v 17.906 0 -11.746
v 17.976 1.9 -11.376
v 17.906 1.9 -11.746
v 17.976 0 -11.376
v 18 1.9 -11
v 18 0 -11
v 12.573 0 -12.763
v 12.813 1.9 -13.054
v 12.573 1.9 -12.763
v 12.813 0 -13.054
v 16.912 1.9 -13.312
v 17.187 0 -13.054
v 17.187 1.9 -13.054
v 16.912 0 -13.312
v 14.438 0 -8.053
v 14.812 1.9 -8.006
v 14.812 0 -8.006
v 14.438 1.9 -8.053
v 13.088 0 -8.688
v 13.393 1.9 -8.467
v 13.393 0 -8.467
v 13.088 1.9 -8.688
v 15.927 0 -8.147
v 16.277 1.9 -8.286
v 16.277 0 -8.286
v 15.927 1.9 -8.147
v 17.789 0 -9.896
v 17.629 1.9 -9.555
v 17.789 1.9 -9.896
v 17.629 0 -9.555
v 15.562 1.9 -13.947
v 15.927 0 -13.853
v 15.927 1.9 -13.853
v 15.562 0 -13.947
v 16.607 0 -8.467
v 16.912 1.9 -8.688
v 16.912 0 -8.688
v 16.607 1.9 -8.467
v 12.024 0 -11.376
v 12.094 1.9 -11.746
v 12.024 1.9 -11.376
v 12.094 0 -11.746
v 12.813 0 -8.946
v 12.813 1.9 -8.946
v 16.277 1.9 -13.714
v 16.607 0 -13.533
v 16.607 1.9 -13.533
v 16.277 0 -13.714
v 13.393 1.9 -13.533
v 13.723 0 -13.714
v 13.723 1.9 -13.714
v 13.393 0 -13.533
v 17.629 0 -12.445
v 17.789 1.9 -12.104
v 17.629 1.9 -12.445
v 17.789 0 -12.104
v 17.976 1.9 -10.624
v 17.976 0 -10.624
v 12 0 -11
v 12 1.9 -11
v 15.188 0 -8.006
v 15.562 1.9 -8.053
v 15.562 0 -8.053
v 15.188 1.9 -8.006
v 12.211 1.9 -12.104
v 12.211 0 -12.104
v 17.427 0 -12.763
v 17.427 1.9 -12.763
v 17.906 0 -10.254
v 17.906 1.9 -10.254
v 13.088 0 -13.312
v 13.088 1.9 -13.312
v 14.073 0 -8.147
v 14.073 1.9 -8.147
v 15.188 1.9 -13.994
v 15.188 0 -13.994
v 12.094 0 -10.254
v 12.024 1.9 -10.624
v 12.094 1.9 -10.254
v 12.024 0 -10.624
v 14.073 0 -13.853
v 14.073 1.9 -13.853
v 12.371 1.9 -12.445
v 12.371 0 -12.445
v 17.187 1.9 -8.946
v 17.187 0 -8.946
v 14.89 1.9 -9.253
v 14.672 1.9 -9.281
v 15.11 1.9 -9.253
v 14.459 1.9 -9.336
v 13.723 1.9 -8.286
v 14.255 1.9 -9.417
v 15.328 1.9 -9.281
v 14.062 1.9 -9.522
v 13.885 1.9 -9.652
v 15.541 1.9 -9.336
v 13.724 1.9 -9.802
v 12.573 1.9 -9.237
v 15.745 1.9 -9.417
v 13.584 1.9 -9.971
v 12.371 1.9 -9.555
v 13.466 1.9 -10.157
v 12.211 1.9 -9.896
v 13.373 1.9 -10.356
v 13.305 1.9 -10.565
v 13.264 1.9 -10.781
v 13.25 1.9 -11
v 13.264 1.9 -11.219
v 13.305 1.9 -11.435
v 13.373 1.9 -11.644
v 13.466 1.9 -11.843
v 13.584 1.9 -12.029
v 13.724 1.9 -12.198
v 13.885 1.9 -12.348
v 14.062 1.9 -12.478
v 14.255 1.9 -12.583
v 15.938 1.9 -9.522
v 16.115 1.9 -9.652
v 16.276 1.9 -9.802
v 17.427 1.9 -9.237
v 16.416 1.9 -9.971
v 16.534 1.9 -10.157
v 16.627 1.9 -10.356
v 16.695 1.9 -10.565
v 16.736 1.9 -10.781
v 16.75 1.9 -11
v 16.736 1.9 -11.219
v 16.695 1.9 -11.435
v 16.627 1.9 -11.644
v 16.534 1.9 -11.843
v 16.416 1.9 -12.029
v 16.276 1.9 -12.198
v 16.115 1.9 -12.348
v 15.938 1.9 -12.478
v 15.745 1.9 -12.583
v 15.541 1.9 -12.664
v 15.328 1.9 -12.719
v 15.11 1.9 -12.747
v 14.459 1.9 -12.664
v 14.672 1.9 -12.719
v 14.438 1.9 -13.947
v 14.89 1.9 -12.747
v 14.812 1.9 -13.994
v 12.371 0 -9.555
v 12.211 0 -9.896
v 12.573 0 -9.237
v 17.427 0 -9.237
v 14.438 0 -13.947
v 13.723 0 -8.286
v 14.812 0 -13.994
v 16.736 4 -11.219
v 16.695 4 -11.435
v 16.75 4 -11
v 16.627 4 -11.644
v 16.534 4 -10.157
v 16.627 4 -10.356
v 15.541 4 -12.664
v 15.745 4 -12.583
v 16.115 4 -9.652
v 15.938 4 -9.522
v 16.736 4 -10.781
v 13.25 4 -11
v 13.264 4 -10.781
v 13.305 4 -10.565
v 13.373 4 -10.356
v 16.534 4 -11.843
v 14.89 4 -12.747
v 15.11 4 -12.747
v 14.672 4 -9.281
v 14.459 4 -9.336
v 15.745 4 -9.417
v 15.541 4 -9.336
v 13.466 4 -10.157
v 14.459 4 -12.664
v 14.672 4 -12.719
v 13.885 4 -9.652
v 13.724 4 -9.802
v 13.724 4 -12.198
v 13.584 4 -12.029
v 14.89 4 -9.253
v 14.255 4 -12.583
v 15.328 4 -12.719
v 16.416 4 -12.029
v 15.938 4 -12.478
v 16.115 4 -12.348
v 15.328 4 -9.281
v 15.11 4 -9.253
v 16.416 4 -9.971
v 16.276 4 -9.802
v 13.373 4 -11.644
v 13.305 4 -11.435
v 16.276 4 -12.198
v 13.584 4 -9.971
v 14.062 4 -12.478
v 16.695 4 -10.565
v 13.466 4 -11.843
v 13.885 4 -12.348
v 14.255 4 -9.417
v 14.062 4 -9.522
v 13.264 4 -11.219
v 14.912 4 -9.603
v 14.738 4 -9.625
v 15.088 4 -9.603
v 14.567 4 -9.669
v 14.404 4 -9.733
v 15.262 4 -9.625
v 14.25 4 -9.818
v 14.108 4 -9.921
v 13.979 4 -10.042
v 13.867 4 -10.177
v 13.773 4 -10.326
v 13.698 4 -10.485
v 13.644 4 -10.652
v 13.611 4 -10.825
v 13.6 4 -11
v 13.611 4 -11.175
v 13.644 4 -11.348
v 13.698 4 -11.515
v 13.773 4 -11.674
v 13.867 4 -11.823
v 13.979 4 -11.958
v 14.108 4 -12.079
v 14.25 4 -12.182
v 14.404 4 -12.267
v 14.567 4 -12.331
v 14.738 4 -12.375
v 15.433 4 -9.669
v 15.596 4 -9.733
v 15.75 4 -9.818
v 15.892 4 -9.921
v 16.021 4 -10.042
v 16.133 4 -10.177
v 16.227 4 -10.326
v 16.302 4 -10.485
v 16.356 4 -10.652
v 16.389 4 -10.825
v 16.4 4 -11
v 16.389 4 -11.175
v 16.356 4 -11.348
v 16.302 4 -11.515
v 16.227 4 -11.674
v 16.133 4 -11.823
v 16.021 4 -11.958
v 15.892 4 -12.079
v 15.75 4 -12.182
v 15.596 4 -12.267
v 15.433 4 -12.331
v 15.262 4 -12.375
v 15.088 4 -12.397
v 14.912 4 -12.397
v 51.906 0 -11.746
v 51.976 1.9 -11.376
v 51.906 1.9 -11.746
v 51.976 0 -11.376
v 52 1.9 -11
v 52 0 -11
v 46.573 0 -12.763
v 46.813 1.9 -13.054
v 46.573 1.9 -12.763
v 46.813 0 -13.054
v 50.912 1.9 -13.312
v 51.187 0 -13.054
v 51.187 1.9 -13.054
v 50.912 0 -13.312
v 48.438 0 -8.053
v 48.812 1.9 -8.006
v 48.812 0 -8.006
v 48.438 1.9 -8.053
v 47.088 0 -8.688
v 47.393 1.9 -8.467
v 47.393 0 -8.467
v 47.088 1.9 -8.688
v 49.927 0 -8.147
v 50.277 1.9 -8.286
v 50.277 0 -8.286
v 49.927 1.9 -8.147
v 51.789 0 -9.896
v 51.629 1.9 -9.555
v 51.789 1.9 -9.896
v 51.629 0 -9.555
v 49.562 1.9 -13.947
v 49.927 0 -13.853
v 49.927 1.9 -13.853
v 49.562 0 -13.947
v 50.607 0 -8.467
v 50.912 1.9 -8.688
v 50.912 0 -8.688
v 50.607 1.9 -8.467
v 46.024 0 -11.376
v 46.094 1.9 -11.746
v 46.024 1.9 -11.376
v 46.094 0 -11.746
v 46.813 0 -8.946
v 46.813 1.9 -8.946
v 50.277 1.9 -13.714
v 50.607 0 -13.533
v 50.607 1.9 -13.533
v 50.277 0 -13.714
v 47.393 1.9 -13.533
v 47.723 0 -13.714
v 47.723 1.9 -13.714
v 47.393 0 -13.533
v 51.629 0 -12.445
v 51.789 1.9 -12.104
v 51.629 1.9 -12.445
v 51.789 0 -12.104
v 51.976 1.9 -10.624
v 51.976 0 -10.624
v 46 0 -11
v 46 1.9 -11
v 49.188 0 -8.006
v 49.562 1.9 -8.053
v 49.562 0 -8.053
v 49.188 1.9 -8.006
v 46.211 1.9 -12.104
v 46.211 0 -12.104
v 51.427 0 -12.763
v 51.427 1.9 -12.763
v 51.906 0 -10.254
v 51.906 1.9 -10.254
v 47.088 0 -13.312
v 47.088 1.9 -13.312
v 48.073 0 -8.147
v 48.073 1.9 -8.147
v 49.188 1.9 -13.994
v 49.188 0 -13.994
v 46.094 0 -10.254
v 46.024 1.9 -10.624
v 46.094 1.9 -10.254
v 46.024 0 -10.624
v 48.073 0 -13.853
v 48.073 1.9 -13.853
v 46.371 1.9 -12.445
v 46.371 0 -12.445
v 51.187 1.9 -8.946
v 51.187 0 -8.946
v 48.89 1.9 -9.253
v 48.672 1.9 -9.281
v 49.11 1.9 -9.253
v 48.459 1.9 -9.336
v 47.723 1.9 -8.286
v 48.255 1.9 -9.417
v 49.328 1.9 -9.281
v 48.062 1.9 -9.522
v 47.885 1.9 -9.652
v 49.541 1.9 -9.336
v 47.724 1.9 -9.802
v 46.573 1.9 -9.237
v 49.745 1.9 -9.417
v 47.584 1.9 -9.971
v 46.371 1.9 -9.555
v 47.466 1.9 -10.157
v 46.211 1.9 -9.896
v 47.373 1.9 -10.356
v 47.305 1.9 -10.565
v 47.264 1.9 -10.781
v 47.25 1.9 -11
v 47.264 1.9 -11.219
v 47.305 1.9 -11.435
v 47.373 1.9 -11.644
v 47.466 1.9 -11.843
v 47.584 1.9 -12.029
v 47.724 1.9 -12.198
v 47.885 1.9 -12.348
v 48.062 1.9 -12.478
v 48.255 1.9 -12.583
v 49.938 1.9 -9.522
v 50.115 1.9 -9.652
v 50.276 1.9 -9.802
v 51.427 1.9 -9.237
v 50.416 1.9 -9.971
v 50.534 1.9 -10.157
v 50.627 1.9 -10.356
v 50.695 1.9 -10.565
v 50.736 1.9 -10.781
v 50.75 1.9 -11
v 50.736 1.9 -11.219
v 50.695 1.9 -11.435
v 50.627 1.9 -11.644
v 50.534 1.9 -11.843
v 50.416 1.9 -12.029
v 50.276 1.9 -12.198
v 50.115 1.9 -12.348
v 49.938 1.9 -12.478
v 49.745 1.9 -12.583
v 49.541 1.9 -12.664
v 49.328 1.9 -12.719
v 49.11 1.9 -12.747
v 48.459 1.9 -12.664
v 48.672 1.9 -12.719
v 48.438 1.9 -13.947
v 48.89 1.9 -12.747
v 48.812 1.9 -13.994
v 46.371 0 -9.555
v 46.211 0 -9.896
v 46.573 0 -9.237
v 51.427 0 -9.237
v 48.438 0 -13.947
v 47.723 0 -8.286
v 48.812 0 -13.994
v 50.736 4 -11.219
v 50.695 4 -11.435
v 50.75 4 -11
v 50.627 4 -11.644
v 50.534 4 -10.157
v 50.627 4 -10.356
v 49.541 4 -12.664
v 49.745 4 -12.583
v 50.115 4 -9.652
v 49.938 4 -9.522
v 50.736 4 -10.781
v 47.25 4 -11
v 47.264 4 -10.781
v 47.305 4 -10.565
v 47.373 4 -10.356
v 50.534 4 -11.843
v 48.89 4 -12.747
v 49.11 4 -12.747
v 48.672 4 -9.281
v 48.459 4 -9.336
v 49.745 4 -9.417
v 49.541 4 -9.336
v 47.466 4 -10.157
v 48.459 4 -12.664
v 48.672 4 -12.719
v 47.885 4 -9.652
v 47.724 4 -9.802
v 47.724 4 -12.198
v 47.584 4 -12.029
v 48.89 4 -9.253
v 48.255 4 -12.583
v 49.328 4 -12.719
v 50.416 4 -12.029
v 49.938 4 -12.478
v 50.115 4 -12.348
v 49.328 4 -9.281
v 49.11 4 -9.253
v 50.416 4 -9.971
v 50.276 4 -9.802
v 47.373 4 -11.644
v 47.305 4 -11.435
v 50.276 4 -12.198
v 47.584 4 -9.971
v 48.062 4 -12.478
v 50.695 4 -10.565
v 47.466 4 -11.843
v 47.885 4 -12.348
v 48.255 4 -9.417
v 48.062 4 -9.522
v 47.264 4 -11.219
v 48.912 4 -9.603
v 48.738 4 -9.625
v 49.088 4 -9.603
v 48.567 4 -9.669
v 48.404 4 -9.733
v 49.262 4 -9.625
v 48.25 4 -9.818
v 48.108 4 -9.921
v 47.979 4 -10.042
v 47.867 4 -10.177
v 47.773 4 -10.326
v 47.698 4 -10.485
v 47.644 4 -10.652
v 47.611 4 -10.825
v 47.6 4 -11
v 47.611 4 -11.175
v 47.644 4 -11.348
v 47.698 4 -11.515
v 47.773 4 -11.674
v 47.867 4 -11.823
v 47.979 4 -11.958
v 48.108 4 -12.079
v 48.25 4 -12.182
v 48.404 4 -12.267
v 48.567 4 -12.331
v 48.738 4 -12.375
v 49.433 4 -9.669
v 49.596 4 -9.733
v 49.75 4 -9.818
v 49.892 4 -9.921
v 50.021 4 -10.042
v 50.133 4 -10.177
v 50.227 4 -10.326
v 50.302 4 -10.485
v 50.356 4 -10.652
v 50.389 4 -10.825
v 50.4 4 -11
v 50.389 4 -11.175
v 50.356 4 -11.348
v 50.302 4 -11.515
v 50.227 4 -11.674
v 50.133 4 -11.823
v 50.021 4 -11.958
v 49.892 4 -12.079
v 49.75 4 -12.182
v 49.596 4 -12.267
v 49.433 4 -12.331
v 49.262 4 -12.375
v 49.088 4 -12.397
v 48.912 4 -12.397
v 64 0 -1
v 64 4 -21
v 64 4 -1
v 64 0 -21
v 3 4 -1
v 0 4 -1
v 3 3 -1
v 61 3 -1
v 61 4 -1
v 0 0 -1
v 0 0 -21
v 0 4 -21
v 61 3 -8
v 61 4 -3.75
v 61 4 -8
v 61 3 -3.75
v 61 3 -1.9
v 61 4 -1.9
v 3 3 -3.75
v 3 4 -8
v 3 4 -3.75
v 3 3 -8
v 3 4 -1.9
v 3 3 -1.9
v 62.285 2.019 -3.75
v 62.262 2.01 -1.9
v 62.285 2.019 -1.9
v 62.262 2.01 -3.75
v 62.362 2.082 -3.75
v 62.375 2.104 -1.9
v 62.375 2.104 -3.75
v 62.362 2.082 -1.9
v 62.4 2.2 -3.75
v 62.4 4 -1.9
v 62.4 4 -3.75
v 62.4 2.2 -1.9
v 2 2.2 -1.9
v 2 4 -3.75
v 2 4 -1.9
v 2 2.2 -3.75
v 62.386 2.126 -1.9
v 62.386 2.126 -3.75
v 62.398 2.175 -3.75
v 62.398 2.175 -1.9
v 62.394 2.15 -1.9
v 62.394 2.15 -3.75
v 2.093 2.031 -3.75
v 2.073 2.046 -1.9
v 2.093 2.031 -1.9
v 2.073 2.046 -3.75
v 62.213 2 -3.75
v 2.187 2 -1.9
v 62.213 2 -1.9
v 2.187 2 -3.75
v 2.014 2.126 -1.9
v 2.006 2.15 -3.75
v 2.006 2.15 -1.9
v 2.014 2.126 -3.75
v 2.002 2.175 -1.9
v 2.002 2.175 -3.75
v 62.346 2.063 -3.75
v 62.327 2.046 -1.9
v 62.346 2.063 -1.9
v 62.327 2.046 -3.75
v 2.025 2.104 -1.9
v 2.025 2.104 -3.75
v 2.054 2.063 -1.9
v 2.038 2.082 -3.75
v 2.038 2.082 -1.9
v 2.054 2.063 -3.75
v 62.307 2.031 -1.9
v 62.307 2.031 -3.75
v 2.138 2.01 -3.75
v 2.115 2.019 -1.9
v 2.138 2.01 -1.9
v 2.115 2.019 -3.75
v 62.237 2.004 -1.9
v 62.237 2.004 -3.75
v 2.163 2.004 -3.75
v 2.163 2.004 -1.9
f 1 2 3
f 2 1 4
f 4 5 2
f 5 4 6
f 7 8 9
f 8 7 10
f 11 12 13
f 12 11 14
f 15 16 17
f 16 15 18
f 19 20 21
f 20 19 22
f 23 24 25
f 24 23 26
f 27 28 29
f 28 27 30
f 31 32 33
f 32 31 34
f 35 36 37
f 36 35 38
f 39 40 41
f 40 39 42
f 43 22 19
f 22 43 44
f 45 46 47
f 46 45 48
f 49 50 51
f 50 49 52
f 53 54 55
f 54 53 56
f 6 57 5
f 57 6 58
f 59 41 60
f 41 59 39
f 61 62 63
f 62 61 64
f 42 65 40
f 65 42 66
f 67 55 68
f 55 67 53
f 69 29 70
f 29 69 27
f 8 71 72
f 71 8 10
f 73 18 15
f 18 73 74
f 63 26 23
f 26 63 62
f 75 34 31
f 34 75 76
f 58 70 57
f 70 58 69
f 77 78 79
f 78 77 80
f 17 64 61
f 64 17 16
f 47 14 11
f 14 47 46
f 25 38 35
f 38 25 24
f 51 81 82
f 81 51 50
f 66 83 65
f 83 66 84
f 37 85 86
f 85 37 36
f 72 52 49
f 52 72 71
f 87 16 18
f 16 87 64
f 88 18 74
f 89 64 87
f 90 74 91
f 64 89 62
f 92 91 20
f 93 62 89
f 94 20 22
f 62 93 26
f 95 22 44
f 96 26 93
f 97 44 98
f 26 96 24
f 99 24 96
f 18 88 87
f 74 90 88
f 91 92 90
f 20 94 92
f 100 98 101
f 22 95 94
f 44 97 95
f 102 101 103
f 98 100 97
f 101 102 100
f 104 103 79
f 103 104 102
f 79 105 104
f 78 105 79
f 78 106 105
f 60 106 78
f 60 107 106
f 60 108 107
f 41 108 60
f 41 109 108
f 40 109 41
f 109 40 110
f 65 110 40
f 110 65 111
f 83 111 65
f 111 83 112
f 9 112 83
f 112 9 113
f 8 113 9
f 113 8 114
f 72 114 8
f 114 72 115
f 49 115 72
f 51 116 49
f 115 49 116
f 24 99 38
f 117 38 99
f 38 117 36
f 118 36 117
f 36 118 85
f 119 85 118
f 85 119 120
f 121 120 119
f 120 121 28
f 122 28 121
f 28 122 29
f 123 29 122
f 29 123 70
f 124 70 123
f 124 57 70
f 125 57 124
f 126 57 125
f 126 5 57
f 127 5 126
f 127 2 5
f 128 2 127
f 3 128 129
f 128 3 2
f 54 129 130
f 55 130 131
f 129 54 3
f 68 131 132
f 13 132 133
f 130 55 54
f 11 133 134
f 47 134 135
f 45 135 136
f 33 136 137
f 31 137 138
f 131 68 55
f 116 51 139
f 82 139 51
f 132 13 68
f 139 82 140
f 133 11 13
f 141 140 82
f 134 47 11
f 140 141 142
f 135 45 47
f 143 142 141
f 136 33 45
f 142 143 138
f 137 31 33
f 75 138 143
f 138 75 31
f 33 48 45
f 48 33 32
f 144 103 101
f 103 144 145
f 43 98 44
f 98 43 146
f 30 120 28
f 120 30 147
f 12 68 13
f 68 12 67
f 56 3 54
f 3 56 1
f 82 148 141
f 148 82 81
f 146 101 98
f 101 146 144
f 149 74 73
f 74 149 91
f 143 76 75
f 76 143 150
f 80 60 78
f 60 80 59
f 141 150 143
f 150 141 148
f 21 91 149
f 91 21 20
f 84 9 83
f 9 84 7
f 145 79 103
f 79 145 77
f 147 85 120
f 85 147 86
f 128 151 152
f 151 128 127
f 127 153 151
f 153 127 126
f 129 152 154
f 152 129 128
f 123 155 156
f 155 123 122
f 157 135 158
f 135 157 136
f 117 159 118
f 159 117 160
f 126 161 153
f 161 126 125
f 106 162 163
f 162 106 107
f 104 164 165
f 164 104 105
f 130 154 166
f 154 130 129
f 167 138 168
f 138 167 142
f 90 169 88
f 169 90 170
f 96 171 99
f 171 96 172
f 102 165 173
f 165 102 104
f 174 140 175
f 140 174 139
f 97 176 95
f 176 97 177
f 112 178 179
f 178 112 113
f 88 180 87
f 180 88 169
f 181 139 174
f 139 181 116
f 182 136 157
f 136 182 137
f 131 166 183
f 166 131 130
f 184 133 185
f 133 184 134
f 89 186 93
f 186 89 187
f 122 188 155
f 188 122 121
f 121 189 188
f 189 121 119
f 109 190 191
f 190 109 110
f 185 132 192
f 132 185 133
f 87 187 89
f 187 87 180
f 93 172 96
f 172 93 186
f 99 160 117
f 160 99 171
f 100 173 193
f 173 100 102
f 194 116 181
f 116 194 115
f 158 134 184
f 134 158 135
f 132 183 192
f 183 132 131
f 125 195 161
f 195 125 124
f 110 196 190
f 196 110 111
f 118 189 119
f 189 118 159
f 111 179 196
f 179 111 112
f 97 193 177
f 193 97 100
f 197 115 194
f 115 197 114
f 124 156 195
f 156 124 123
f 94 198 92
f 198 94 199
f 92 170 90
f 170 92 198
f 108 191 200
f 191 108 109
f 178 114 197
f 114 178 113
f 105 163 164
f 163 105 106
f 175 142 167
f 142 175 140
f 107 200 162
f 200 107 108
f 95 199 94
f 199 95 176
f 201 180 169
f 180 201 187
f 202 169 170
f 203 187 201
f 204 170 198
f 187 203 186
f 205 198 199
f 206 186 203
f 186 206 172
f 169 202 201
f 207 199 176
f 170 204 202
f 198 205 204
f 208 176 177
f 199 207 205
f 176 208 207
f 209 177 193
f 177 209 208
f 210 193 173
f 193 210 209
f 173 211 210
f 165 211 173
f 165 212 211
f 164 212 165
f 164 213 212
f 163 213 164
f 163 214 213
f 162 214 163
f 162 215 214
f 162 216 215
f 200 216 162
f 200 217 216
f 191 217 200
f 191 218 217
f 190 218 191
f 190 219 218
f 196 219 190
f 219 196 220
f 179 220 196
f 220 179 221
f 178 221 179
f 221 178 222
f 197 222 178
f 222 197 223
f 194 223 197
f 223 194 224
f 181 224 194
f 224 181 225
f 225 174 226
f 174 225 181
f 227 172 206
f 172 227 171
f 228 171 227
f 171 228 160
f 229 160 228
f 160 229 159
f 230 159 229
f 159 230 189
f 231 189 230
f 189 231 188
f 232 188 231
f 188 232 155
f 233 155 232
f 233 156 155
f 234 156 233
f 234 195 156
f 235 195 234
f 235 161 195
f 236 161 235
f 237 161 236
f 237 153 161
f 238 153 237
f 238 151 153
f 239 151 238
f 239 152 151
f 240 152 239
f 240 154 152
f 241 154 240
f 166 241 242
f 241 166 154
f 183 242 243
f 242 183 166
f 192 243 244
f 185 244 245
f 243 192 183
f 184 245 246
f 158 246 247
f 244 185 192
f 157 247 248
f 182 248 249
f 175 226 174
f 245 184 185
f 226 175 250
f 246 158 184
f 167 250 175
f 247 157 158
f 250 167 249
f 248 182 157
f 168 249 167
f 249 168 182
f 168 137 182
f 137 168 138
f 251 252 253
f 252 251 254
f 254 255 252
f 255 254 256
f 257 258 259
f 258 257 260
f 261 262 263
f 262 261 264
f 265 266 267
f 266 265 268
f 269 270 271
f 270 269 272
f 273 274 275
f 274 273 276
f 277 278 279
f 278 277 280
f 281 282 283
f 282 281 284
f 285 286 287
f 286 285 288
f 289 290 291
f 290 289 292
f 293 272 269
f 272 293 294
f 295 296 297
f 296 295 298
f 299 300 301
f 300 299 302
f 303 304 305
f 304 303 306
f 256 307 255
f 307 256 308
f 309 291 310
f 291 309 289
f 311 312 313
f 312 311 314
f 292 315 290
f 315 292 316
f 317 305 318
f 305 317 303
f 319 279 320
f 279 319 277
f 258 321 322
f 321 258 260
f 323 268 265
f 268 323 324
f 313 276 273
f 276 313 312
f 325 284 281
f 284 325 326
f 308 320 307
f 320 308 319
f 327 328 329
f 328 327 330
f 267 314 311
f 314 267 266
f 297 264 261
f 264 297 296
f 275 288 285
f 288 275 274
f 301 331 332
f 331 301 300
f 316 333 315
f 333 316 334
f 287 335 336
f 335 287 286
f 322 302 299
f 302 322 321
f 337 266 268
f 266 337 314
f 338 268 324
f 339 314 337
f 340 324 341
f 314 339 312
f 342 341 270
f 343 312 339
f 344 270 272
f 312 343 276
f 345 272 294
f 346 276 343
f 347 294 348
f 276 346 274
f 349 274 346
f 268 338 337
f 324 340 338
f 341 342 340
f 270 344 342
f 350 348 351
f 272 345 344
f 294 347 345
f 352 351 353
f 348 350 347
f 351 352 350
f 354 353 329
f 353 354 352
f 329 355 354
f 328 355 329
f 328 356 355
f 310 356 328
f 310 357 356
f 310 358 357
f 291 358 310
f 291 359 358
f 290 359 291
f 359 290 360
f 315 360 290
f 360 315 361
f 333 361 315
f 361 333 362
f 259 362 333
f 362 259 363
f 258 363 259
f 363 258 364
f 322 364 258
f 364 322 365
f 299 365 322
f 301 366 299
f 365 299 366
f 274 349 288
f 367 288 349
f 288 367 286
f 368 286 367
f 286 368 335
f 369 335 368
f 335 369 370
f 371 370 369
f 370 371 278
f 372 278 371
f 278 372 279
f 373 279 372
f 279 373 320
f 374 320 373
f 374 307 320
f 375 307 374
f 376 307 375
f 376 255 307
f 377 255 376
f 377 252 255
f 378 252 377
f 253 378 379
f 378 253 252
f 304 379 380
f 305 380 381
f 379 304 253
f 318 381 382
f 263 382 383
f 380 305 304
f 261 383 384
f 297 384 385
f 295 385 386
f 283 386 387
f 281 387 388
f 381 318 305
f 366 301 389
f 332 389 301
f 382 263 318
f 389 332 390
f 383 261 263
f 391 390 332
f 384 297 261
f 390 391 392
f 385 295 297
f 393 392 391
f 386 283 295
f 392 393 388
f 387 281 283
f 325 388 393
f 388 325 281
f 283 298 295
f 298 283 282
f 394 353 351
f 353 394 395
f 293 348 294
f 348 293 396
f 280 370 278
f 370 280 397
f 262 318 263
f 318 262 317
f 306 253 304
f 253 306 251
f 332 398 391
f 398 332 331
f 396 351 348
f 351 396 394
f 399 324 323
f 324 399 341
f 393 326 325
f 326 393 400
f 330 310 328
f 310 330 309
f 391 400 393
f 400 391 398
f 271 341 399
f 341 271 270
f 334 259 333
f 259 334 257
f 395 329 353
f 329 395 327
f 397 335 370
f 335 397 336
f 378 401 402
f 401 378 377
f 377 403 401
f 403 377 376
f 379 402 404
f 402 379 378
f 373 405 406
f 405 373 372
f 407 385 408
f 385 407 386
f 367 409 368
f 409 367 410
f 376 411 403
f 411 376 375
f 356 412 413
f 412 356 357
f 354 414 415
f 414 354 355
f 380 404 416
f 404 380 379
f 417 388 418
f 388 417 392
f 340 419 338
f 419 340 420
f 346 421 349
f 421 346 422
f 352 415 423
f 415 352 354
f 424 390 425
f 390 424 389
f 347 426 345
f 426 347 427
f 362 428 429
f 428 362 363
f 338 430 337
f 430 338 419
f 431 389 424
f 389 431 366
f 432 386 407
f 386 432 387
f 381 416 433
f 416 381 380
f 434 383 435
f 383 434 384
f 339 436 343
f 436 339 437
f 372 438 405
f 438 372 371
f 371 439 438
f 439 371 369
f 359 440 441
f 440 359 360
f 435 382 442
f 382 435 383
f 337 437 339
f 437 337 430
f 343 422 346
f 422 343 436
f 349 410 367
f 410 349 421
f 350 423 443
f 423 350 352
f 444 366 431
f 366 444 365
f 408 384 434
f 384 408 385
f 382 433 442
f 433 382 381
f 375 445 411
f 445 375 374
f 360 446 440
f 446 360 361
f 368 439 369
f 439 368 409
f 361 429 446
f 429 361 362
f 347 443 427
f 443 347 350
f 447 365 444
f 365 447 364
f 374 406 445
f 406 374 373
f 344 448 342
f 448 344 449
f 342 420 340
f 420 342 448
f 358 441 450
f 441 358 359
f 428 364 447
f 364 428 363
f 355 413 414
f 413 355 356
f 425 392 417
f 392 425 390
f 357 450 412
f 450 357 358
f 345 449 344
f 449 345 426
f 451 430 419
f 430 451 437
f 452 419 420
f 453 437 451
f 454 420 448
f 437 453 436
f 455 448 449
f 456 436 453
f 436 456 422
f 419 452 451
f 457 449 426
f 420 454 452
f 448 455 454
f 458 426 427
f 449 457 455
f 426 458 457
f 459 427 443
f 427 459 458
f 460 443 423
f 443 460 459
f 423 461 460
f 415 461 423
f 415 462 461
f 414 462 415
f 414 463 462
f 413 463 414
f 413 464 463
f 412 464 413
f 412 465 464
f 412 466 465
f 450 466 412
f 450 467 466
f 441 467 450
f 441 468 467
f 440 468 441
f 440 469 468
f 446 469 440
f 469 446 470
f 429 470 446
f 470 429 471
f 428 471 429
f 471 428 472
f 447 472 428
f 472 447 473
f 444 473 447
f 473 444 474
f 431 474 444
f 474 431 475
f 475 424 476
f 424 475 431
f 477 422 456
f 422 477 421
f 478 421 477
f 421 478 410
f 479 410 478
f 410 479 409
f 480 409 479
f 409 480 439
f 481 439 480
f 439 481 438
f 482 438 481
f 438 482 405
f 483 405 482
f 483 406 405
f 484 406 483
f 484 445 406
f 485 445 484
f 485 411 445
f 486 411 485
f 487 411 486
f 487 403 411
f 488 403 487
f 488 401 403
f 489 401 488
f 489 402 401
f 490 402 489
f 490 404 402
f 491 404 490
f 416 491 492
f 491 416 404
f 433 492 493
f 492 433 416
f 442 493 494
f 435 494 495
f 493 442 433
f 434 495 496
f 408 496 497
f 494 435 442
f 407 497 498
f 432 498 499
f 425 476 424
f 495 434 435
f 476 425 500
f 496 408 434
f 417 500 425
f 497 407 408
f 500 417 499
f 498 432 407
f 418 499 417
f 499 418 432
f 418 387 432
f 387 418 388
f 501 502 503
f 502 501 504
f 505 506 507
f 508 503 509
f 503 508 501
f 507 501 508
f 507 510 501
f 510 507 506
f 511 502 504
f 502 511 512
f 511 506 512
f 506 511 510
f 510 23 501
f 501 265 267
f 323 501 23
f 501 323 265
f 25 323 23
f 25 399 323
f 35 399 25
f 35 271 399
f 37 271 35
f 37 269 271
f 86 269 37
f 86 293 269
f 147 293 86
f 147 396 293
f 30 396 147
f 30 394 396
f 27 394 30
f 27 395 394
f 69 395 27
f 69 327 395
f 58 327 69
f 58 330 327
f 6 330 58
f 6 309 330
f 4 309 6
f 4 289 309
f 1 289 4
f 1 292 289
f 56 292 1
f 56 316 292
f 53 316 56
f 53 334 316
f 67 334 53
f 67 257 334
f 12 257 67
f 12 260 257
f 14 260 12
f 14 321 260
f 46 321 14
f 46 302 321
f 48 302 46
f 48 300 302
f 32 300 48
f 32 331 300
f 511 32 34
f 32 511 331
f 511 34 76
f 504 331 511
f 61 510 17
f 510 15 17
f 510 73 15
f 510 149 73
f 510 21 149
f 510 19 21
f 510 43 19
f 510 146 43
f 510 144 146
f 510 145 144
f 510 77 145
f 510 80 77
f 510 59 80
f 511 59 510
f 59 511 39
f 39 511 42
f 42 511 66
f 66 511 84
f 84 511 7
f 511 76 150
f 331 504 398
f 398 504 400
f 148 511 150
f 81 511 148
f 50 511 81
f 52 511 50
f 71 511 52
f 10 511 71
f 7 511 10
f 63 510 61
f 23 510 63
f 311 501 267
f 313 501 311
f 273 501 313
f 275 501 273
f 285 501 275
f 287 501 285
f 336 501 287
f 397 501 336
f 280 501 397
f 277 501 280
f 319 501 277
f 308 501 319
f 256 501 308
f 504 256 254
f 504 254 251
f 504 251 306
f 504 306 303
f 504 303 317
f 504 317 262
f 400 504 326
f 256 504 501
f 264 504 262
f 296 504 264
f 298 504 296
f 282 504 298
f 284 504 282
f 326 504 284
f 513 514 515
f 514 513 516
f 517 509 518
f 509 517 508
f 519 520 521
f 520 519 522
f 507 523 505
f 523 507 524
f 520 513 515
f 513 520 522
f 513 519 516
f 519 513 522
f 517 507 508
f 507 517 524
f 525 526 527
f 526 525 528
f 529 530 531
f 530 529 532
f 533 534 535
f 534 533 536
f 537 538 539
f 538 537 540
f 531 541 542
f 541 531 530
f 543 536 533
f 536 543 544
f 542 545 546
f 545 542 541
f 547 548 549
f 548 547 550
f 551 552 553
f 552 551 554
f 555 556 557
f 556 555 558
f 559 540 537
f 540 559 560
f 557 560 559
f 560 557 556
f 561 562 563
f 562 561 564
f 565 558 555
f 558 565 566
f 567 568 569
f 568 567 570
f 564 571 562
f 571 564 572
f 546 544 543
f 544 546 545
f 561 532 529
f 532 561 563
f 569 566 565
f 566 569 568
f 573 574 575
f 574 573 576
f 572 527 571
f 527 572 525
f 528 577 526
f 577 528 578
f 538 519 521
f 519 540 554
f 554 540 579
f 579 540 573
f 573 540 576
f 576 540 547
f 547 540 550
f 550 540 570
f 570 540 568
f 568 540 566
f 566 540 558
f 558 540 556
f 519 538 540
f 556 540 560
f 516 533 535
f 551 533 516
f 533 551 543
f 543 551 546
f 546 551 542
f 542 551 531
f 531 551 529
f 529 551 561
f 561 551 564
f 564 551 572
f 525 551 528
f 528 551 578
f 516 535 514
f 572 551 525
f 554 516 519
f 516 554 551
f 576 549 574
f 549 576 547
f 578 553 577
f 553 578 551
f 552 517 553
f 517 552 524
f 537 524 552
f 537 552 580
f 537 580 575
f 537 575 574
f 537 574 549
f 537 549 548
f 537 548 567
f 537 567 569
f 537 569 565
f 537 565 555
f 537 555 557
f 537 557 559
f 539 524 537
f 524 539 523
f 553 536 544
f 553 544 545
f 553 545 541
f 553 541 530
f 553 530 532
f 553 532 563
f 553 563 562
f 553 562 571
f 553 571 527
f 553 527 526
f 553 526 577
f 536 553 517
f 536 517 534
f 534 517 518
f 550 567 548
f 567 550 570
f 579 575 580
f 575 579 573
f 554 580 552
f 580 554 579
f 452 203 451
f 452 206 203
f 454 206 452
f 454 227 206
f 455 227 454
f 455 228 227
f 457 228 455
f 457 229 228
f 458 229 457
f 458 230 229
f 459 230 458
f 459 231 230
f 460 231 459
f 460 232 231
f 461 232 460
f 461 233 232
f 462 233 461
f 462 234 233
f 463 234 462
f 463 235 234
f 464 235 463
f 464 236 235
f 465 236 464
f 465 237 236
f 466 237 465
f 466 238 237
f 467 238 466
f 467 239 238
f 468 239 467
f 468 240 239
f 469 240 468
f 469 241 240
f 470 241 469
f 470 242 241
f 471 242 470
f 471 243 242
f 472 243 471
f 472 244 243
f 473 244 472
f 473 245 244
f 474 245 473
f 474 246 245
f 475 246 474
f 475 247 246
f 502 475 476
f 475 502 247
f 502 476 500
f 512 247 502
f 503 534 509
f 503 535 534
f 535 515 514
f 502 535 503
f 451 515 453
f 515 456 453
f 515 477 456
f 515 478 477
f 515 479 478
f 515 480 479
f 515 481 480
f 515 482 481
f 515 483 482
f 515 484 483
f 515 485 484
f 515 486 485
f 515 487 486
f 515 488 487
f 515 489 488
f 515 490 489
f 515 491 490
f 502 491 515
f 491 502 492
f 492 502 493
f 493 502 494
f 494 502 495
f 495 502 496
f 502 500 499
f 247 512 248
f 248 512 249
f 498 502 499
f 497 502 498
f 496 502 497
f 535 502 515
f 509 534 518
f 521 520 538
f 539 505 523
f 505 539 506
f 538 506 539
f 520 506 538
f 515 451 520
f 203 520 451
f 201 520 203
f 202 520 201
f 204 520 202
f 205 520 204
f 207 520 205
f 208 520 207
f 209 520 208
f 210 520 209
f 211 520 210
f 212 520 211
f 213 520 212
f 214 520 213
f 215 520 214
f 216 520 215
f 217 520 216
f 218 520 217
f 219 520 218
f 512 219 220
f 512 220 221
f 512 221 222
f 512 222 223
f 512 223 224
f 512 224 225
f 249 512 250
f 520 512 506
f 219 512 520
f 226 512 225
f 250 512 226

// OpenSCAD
$fn=50;
pcbThick = 1.65;
pcbX = 60;
pcbY = 100;
pcbZ = 1;

fit = .2;

wallThick = 3;
wallSlot=1;
wallInner = wallThick-wallSlot;

cutY = wallThick+1;

boxX = pcbX + 2* wallInner;
boxY = pcbY + 2* wallInner;
boxZ = 20;

fixZ = boxZ-7;
fixY = 7;

module main() {
    difference() {
        cube([boxX, boxY, boxZ]);

        translate([wallThick, wallThick+fixY, wallThick])
            cube([boxX-2*wallThick, boxY-2*wallThick-fixY, boxZ]);

        translate([wallThick, wallThick, fixZ])
            cube([boxX-2*wallThick, boxY-2*wallThick, boxZ]);

        slot();

        cable();
        mounting();
        translate([15,-0.1,10]) m3screw();
        translate([boxX-15,-0.1,10]) m3screw();
    }
}

module upper() {
    difference() {
        main();
        translate ([-1,-1,-1]) cube([boxX+2, cutY+1, boxZ+2]);
    }
}

module fixture() {
    cube([boxX,cutY+fixY,fixZ]);
}

module m3screw() {
    rotate([-90,0,0]) {
        cylinder(r=3,h=2);
        cylinder(r=1.75,h=cutY+.1);
        cylinder(r=1.4,h=cutY+fixY+1);
    }
}

module cable() {
    translate([boxX/2,boxY/2,-1])
        cylinder(r=7.5,h=boxZ);
}

module mounting() {
    translate([boxX/2,boxY/2+35,-1]) cylinder(r=2,h=boxZ);
    translate([boxX/2,boxY/2-35,-1]) cylinder(r=2,h=boxZ);
}

module lower() {
    translate([0,0,-boxZ-1]) { // Move so you can see both
        difference() {
            main();
            translate ([-1,cutY,-1]) cube([boxX+2, boxY, boxZ+2]);
        }

    }
}

module PCB() {
    translate([wallInner+fit, wallInner+fit,boxZ-pcbZ-pcbThick])
        cube([pcbX,pcbY,pcbThick]);
}

module slot() {
       minkowski() {
            translate([0,0,-fit/2]) cylinder(r=fit, h=fit);
            PCB();
       }
}

//upper();
lower();
//%PCB();
